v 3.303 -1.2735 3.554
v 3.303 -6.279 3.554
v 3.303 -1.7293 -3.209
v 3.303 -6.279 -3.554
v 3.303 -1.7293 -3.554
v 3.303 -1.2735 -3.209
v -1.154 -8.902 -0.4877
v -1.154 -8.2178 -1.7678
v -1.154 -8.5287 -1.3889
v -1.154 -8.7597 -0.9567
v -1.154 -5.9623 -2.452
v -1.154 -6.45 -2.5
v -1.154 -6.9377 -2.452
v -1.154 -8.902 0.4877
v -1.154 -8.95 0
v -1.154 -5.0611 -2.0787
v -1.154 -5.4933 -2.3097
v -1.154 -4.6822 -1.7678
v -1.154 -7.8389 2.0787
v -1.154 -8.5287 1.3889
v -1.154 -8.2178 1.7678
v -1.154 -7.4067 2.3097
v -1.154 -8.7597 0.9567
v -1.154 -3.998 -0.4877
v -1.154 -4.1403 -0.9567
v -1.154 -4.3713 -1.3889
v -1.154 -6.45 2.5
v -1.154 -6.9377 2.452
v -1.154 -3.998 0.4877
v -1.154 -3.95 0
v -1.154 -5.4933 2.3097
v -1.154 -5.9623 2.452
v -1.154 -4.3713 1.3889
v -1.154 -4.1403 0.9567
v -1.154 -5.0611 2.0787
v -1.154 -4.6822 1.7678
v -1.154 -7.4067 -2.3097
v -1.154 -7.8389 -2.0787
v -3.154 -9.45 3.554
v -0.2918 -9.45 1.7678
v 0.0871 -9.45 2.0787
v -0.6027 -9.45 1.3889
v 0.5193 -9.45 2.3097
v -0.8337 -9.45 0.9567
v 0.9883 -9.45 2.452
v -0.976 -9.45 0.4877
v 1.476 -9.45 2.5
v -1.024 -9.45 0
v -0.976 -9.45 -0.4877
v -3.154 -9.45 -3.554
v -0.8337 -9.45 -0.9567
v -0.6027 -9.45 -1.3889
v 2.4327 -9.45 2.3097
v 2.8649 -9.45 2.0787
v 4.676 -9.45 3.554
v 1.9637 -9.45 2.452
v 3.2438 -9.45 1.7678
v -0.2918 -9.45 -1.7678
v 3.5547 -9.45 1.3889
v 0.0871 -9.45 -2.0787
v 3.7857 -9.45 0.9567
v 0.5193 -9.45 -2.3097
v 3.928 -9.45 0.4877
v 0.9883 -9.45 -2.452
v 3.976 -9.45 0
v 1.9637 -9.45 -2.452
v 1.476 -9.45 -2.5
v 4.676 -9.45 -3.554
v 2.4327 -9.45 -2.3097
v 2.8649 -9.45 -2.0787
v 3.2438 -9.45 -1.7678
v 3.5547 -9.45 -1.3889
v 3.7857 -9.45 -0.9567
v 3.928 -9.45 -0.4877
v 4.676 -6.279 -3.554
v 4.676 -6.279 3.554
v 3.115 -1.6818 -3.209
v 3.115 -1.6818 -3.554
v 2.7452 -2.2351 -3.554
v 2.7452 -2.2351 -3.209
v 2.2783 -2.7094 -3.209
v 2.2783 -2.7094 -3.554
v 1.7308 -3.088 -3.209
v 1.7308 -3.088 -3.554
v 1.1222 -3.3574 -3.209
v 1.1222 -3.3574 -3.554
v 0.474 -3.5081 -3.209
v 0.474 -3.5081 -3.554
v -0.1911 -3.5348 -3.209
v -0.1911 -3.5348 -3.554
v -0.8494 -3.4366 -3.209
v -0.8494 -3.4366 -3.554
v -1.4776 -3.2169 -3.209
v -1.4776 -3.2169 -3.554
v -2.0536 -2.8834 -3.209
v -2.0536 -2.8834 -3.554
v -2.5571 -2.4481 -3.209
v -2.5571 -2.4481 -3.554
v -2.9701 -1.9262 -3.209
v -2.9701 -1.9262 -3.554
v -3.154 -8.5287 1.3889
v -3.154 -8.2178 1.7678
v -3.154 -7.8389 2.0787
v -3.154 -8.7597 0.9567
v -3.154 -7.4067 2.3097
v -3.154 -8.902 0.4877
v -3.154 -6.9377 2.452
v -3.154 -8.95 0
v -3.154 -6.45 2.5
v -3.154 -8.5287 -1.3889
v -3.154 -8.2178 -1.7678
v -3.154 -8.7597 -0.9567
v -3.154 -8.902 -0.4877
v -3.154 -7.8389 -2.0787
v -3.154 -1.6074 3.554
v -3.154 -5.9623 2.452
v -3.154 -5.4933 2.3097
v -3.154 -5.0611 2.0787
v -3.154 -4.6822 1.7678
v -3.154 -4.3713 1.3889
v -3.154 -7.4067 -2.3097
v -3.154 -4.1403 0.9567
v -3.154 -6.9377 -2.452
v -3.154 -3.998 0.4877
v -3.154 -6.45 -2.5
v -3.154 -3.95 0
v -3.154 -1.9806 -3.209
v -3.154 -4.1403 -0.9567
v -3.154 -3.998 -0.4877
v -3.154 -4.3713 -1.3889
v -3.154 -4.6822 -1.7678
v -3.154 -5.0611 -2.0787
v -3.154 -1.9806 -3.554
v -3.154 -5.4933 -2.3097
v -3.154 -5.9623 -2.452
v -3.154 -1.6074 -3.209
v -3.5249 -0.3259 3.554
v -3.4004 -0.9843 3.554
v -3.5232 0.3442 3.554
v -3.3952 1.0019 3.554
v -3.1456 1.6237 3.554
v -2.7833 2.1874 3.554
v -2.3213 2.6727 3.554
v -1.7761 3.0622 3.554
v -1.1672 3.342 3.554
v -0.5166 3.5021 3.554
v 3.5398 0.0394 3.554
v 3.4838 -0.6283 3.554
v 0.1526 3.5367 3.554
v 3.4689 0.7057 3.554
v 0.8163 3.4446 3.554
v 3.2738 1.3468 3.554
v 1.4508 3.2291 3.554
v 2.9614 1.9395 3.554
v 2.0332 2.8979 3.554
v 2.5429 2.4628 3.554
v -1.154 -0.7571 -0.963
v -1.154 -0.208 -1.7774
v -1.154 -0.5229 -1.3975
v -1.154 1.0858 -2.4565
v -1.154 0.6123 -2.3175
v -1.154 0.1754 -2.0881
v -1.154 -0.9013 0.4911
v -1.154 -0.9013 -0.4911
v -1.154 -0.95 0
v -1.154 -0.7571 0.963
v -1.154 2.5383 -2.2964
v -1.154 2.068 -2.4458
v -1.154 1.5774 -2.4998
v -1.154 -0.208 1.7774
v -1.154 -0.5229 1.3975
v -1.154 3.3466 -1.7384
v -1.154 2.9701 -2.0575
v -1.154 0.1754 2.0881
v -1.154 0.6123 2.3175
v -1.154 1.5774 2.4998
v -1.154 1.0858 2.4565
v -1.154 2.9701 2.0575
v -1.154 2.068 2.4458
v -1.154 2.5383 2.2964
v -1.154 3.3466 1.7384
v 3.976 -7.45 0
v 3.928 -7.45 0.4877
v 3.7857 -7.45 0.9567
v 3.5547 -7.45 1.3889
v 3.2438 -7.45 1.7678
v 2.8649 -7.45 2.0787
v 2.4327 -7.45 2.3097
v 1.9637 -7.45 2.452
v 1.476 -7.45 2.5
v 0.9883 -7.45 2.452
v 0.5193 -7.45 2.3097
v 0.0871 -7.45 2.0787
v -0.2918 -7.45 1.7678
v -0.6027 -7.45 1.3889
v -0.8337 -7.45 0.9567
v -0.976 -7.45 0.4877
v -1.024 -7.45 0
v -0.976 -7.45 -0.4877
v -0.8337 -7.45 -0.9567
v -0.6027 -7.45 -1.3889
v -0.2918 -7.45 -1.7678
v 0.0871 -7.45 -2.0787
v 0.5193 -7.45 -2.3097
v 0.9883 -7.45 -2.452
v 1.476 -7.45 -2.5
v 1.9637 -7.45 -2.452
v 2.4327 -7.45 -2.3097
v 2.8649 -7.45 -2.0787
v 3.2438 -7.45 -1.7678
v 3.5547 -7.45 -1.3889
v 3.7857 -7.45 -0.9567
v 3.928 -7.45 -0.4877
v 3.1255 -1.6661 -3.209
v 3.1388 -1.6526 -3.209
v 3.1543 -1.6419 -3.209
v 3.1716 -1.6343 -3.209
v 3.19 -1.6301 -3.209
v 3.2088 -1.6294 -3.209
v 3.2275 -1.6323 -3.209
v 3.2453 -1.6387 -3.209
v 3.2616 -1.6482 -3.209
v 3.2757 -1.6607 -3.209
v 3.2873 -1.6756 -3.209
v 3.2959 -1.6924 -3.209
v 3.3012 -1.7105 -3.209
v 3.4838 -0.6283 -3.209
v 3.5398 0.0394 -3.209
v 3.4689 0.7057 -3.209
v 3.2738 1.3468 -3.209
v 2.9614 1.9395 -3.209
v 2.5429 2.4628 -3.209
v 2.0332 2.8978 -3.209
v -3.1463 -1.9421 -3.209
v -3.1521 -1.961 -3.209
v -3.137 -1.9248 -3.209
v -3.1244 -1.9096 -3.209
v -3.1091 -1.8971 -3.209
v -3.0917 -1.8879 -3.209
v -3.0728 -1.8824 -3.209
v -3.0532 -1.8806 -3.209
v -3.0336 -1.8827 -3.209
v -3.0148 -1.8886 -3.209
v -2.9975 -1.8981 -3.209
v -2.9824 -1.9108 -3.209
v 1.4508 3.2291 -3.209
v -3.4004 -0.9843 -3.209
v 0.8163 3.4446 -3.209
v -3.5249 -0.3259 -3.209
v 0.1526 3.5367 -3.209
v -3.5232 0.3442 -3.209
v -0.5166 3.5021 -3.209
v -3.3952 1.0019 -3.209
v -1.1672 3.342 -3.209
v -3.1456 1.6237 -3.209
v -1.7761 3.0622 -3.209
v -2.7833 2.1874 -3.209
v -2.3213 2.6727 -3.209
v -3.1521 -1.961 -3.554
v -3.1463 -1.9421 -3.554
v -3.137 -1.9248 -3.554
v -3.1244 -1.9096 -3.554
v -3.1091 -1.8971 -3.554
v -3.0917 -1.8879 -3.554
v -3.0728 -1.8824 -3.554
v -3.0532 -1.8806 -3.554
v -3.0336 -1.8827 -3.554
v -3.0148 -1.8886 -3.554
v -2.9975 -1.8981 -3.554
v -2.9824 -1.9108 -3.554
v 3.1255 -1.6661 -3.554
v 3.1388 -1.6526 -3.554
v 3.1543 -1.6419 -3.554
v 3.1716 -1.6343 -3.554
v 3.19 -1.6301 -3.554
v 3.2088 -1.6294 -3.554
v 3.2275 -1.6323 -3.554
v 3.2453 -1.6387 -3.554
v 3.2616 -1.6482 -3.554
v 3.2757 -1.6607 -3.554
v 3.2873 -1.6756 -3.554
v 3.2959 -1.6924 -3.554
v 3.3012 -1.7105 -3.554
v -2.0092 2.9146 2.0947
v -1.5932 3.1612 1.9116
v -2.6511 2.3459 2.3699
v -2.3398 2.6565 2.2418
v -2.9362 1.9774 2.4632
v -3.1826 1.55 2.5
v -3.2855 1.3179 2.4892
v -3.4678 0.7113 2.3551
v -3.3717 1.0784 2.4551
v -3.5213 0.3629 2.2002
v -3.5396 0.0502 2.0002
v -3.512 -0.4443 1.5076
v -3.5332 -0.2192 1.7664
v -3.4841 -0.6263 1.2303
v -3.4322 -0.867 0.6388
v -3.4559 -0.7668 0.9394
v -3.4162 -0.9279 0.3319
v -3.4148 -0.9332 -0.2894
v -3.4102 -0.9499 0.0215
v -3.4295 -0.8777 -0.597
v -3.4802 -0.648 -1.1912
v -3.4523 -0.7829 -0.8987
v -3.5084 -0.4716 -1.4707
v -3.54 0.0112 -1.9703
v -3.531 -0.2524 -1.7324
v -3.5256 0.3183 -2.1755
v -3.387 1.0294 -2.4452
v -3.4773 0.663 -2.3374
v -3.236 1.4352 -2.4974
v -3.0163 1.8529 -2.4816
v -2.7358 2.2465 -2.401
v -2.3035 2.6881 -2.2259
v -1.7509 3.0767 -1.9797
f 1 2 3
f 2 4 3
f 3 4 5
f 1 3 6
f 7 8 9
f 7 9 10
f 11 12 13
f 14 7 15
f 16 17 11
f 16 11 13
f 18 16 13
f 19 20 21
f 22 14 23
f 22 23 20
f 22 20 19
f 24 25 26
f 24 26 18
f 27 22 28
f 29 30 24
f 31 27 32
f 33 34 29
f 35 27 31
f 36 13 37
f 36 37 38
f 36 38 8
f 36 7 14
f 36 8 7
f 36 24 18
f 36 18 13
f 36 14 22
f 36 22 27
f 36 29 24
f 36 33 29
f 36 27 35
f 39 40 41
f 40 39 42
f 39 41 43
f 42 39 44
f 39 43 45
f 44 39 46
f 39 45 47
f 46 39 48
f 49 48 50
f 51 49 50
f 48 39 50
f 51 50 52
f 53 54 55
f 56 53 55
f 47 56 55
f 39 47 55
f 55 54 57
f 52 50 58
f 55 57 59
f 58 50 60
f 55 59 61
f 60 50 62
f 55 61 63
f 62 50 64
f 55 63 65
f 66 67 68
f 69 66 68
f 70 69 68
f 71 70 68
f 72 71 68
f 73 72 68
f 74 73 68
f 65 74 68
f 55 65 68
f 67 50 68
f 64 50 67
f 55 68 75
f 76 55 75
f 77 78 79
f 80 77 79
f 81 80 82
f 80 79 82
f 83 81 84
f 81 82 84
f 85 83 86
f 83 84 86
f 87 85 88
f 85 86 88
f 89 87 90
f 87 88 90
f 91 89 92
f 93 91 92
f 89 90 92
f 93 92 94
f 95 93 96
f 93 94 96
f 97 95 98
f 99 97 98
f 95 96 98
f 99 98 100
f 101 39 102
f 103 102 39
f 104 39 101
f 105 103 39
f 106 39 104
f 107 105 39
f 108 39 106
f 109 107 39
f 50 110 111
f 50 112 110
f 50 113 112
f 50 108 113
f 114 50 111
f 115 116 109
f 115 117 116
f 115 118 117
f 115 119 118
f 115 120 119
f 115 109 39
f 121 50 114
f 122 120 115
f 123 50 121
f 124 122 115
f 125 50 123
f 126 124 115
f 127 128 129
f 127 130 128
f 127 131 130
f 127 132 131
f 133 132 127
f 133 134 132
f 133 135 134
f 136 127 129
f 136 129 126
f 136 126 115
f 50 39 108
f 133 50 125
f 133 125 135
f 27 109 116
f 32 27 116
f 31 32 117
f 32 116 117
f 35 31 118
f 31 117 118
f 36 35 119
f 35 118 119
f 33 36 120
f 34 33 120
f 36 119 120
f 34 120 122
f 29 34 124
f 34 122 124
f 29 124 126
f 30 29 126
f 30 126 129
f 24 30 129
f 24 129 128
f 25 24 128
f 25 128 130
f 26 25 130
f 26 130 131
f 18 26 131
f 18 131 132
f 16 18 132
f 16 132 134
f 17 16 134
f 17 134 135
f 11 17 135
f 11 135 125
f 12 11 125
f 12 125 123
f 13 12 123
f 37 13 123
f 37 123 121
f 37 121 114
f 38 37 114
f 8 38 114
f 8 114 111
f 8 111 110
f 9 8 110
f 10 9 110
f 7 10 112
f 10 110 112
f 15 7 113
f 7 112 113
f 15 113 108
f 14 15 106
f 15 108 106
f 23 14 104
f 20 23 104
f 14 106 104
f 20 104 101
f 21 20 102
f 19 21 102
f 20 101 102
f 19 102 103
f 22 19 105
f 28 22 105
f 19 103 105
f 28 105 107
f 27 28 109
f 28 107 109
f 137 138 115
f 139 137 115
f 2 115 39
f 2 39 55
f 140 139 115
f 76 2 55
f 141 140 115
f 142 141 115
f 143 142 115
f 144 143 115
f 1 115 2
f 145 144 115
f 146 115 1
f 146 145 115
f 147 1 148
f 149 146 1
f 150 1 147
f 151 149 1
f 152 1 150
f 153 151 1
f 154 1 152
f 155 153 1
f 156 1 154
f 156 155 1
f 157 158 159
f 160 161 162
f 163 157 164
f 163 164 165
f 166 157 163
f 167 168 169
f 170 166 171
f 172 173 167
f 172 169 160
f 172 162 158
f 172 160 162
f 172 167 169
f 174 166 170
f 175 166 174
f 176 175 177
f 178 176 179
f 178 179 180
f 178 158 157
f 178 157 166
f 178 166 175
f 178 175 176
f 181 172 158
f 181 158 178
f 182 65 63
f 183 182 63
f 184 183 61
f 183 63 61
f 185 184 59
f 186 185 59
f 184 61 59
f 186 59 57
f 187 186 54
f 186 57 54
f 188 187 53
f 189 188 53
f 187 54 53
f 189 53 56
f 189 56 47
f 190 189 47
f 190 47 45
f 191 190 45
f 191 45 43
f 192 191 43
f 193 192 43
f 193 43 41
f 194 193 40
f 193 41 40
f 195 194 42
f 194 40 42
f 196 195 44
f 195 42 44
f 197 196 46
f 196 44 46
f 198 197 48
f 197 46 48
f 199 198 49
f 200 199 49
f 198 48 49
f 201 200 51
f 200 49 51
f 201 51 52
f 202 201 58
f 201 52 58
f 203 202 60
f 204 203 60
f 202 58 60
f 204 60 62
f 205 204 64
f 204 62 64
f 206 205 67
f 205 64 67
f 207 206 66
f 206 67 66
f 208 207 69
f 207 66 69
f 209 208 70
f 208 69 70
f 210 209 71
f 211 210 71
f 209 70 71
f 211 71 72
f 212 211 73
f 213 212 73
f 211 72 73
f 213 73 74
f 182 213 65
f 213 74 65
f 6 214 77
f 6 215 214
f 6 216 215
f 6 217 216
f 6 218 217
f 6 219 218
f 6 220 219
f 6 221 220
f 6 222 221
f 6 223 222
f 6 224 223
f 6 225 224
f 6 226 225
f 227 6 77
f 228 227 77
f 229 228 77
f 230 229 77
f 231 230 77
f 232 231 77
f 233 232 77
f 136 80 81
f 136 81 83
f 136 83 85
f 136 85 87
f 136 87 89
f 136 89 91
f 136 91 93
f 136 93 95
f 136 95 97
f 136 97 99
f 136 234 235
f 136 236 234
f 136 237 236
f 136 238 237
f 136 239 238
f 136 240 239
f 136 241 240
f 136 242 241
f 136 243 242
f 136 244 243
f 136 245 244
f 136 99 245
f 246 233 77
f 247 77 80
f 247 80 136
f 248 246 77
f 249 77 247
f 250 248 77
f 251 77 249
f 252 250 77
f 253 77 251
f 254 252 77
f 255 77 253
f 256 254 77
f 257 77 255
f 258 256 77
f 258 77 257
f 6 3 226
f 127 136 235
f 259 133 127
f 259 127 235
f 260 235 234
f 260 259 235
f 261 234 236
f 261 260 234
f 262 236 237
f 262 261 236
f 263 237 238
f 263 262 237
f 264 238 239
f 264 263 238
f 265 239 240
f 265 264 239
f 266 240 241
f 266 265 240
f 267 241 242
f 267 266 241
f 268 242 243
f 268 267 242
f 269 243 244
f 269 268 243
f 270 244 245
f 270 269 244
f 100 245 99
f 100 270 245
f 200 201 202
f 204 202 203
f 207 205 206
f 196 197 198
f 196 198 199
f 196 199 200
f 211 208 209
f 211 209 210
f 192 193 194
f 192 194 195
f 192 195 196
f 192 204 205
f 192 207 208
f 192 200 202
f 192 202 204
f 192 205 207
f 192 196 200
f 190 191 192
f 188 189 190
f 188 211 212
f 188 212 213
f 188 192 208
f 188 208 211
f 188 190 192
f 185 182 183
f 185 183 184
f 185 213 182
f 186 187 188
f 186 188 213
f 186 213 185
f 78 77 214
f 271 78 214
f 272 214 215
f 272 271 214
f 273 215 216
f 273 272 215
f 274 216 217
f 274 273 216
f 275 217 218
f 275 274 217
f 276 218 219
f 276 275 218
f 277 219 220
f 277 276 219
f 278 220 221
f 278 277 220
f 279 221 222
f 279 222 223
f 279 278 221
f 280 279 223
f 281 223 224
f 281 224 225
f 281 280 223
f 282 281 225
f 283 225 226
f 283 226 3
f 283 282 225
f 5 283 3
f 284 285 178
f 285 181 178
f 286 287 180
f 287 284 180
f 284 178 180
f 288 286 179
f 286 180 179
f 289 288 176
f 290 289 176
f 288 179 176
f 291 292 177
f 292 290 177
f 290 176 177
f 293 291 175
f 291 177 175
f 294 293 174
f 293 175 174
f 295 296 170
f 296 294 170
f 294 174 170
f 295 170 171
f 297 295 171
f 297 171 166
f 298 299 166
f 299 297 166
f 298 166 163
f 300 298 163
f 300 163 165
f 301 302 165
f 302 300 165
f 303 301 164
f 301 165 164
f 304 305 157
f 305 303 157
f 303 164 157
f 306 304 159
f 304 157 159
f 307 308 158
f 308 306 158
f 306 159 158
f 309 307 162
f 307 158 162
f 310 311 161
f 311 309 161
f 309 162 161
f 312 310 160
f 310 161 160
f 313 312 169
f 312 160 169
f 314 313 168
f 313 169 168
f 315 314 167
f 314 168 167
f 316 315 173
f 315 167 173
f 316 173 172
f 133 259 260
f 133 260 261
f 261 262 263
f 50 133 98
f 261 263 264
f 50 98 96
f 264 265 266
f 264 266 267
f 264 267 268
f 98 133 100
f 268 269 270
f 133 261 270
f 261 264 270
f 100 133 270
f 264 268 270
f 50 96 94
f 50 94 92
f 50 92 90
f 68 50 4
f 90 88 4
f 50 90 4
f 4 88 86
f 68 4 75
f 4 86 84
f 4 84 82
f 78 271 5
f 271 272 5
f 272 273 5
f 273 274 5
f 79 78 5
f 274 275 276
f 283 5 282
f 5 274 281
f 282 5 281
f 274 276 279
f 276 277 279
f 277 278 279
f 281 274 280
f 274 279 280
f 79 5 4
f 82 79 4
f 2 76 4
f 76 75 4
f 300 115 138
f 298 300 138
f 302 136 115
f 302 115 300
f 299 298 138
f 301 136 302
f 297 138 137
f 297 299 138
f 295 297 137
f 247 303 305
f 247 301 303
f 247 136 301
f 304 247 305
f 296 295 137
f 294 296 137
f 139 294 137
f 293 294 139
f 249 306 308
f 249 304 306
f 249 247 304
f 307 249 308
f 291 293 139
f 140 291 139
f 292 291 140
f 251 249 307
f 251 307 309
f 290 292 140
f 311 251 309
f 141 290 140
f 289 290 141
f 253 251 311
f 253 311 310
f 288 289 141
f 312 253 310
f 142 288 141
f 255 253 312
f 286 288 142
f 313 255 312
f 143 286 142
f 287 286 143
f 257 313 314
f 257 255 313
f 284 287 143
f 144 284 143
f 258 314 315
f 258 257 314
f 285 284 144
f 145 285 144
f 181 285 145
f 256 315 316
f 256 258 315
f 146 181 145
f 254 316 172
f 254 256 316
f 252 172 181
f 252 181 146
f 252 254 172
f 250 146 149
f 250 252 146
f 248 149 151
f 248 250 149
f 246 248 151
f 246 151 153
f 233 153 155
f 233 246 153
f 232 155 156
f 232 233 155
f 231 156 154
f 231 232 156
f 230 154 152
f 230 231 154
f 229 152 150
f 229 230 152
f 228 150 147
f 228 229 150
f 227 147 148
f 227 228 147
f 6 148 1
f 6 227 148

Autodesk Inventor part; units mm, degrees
ref_plane "YZ Plane" through (0, 0, 0) normal (1, 0, 0) x (0, 1, 0)
ref_plane "XZ Plane" through (0, 0, 0) normal (0, 1, 0) x (-1, 0, 0)
ref_plane "XY Plane" through (0, 0, 0) normal (0, 0, 1) x (1, 0, 0)
sketch "Sketch1" plane through (0, 0, 0) normal (0, 0, 1) x (1, 0, 0)
  line L0 (-3.154, -9.45) -> (4.676, -9.45)
  line L1 (4.676, -9.45) -> (4.676, -6.279)
  line L2 (4.676, -6.279) -> (3.303, -6.279)
  line L3 (3.303, -6.279) -> (3.303, -1.2735)
  line L4 (-3.154, -9.45) -> (-3.154, -1.6074)
  arc A0 (3.303, -1.2735) -> (-3.154, -1.6074) centre (0, 0) ccw
  dimension "d0" = 7.83
  dimension "d1" = 9.45
  dimension "d2" = 3.54
  dimension "d3" = 3.154
  dimension "d4" = 3.171
  dimension "d5" = 6.457
extrude "Extrusion1" add sketch "Sketch1" along normal mid plane 7.108
sketch "Sketch2" plane through (-3.154, -9.45, 3.554) normal (0, -1, 0) x (1, 0, 0)
  line L0 (7.83, -7.108) -> (7.83, 0) projected
  circle A0 centre (4.63, -3.554) radius 2.5
  point P0 (3.154, -3.554)
  dimension "d8" = 5
  dimension "d9" = 3.2
extrude "Extrusion2" cut sketch "Sketch2" against normal blind 2
sketch "Sketch3" plane through (-3.154, -9.45, 3.554) normal (-1, 0, 0) x (0, 0, 1)
  line L0 (0, 0) -> (-7.108, 0) projected
  circle A0 centre (-3.554, 3) radius 2.5
  point P0 (-3.554, 9.45)
  dimension "d12" = 5
  dimension "d13" = 3
extrude "Extrusion3" cut sketch "Sketch3" against normal blind 2
sketch "Sketch4" plane through (-1.154, -6.45, 0) normal (-1, 0, 0) x (0, 0, 1)
  circle A0 centre (0, 0) radius 2.5 construction
  circle A1 centre (0, 8) radius 2.5
  circle A2 centre (0, 0) radius 2.5 projected
  point P0 (0, 6.45)
  dimension "d16" = 8
extrude "Extrusion4" cut sketch "Sketch4" along normal through all contours A1
sketch "Sketch5" plane through (0, 0, -3.554) normal (0, 0, -1) x (-1, 0, 0)
  arc A0 (3.154, -1.6074) -> (-3.303, -1.2735) centre (0, 0) ccw projected
  circle A1 centre (0, 0) radius 3.54
extrude "Extrusion5" cut sketch "Sketch5" against normal blind 0.345
fillet "Fillet1" radius 0.1 2 edges at (3.303, -1.2735, -3.3815) (-3.154, -1.6074, -3.3815)
properties part number "LEG LHS" material "250"
